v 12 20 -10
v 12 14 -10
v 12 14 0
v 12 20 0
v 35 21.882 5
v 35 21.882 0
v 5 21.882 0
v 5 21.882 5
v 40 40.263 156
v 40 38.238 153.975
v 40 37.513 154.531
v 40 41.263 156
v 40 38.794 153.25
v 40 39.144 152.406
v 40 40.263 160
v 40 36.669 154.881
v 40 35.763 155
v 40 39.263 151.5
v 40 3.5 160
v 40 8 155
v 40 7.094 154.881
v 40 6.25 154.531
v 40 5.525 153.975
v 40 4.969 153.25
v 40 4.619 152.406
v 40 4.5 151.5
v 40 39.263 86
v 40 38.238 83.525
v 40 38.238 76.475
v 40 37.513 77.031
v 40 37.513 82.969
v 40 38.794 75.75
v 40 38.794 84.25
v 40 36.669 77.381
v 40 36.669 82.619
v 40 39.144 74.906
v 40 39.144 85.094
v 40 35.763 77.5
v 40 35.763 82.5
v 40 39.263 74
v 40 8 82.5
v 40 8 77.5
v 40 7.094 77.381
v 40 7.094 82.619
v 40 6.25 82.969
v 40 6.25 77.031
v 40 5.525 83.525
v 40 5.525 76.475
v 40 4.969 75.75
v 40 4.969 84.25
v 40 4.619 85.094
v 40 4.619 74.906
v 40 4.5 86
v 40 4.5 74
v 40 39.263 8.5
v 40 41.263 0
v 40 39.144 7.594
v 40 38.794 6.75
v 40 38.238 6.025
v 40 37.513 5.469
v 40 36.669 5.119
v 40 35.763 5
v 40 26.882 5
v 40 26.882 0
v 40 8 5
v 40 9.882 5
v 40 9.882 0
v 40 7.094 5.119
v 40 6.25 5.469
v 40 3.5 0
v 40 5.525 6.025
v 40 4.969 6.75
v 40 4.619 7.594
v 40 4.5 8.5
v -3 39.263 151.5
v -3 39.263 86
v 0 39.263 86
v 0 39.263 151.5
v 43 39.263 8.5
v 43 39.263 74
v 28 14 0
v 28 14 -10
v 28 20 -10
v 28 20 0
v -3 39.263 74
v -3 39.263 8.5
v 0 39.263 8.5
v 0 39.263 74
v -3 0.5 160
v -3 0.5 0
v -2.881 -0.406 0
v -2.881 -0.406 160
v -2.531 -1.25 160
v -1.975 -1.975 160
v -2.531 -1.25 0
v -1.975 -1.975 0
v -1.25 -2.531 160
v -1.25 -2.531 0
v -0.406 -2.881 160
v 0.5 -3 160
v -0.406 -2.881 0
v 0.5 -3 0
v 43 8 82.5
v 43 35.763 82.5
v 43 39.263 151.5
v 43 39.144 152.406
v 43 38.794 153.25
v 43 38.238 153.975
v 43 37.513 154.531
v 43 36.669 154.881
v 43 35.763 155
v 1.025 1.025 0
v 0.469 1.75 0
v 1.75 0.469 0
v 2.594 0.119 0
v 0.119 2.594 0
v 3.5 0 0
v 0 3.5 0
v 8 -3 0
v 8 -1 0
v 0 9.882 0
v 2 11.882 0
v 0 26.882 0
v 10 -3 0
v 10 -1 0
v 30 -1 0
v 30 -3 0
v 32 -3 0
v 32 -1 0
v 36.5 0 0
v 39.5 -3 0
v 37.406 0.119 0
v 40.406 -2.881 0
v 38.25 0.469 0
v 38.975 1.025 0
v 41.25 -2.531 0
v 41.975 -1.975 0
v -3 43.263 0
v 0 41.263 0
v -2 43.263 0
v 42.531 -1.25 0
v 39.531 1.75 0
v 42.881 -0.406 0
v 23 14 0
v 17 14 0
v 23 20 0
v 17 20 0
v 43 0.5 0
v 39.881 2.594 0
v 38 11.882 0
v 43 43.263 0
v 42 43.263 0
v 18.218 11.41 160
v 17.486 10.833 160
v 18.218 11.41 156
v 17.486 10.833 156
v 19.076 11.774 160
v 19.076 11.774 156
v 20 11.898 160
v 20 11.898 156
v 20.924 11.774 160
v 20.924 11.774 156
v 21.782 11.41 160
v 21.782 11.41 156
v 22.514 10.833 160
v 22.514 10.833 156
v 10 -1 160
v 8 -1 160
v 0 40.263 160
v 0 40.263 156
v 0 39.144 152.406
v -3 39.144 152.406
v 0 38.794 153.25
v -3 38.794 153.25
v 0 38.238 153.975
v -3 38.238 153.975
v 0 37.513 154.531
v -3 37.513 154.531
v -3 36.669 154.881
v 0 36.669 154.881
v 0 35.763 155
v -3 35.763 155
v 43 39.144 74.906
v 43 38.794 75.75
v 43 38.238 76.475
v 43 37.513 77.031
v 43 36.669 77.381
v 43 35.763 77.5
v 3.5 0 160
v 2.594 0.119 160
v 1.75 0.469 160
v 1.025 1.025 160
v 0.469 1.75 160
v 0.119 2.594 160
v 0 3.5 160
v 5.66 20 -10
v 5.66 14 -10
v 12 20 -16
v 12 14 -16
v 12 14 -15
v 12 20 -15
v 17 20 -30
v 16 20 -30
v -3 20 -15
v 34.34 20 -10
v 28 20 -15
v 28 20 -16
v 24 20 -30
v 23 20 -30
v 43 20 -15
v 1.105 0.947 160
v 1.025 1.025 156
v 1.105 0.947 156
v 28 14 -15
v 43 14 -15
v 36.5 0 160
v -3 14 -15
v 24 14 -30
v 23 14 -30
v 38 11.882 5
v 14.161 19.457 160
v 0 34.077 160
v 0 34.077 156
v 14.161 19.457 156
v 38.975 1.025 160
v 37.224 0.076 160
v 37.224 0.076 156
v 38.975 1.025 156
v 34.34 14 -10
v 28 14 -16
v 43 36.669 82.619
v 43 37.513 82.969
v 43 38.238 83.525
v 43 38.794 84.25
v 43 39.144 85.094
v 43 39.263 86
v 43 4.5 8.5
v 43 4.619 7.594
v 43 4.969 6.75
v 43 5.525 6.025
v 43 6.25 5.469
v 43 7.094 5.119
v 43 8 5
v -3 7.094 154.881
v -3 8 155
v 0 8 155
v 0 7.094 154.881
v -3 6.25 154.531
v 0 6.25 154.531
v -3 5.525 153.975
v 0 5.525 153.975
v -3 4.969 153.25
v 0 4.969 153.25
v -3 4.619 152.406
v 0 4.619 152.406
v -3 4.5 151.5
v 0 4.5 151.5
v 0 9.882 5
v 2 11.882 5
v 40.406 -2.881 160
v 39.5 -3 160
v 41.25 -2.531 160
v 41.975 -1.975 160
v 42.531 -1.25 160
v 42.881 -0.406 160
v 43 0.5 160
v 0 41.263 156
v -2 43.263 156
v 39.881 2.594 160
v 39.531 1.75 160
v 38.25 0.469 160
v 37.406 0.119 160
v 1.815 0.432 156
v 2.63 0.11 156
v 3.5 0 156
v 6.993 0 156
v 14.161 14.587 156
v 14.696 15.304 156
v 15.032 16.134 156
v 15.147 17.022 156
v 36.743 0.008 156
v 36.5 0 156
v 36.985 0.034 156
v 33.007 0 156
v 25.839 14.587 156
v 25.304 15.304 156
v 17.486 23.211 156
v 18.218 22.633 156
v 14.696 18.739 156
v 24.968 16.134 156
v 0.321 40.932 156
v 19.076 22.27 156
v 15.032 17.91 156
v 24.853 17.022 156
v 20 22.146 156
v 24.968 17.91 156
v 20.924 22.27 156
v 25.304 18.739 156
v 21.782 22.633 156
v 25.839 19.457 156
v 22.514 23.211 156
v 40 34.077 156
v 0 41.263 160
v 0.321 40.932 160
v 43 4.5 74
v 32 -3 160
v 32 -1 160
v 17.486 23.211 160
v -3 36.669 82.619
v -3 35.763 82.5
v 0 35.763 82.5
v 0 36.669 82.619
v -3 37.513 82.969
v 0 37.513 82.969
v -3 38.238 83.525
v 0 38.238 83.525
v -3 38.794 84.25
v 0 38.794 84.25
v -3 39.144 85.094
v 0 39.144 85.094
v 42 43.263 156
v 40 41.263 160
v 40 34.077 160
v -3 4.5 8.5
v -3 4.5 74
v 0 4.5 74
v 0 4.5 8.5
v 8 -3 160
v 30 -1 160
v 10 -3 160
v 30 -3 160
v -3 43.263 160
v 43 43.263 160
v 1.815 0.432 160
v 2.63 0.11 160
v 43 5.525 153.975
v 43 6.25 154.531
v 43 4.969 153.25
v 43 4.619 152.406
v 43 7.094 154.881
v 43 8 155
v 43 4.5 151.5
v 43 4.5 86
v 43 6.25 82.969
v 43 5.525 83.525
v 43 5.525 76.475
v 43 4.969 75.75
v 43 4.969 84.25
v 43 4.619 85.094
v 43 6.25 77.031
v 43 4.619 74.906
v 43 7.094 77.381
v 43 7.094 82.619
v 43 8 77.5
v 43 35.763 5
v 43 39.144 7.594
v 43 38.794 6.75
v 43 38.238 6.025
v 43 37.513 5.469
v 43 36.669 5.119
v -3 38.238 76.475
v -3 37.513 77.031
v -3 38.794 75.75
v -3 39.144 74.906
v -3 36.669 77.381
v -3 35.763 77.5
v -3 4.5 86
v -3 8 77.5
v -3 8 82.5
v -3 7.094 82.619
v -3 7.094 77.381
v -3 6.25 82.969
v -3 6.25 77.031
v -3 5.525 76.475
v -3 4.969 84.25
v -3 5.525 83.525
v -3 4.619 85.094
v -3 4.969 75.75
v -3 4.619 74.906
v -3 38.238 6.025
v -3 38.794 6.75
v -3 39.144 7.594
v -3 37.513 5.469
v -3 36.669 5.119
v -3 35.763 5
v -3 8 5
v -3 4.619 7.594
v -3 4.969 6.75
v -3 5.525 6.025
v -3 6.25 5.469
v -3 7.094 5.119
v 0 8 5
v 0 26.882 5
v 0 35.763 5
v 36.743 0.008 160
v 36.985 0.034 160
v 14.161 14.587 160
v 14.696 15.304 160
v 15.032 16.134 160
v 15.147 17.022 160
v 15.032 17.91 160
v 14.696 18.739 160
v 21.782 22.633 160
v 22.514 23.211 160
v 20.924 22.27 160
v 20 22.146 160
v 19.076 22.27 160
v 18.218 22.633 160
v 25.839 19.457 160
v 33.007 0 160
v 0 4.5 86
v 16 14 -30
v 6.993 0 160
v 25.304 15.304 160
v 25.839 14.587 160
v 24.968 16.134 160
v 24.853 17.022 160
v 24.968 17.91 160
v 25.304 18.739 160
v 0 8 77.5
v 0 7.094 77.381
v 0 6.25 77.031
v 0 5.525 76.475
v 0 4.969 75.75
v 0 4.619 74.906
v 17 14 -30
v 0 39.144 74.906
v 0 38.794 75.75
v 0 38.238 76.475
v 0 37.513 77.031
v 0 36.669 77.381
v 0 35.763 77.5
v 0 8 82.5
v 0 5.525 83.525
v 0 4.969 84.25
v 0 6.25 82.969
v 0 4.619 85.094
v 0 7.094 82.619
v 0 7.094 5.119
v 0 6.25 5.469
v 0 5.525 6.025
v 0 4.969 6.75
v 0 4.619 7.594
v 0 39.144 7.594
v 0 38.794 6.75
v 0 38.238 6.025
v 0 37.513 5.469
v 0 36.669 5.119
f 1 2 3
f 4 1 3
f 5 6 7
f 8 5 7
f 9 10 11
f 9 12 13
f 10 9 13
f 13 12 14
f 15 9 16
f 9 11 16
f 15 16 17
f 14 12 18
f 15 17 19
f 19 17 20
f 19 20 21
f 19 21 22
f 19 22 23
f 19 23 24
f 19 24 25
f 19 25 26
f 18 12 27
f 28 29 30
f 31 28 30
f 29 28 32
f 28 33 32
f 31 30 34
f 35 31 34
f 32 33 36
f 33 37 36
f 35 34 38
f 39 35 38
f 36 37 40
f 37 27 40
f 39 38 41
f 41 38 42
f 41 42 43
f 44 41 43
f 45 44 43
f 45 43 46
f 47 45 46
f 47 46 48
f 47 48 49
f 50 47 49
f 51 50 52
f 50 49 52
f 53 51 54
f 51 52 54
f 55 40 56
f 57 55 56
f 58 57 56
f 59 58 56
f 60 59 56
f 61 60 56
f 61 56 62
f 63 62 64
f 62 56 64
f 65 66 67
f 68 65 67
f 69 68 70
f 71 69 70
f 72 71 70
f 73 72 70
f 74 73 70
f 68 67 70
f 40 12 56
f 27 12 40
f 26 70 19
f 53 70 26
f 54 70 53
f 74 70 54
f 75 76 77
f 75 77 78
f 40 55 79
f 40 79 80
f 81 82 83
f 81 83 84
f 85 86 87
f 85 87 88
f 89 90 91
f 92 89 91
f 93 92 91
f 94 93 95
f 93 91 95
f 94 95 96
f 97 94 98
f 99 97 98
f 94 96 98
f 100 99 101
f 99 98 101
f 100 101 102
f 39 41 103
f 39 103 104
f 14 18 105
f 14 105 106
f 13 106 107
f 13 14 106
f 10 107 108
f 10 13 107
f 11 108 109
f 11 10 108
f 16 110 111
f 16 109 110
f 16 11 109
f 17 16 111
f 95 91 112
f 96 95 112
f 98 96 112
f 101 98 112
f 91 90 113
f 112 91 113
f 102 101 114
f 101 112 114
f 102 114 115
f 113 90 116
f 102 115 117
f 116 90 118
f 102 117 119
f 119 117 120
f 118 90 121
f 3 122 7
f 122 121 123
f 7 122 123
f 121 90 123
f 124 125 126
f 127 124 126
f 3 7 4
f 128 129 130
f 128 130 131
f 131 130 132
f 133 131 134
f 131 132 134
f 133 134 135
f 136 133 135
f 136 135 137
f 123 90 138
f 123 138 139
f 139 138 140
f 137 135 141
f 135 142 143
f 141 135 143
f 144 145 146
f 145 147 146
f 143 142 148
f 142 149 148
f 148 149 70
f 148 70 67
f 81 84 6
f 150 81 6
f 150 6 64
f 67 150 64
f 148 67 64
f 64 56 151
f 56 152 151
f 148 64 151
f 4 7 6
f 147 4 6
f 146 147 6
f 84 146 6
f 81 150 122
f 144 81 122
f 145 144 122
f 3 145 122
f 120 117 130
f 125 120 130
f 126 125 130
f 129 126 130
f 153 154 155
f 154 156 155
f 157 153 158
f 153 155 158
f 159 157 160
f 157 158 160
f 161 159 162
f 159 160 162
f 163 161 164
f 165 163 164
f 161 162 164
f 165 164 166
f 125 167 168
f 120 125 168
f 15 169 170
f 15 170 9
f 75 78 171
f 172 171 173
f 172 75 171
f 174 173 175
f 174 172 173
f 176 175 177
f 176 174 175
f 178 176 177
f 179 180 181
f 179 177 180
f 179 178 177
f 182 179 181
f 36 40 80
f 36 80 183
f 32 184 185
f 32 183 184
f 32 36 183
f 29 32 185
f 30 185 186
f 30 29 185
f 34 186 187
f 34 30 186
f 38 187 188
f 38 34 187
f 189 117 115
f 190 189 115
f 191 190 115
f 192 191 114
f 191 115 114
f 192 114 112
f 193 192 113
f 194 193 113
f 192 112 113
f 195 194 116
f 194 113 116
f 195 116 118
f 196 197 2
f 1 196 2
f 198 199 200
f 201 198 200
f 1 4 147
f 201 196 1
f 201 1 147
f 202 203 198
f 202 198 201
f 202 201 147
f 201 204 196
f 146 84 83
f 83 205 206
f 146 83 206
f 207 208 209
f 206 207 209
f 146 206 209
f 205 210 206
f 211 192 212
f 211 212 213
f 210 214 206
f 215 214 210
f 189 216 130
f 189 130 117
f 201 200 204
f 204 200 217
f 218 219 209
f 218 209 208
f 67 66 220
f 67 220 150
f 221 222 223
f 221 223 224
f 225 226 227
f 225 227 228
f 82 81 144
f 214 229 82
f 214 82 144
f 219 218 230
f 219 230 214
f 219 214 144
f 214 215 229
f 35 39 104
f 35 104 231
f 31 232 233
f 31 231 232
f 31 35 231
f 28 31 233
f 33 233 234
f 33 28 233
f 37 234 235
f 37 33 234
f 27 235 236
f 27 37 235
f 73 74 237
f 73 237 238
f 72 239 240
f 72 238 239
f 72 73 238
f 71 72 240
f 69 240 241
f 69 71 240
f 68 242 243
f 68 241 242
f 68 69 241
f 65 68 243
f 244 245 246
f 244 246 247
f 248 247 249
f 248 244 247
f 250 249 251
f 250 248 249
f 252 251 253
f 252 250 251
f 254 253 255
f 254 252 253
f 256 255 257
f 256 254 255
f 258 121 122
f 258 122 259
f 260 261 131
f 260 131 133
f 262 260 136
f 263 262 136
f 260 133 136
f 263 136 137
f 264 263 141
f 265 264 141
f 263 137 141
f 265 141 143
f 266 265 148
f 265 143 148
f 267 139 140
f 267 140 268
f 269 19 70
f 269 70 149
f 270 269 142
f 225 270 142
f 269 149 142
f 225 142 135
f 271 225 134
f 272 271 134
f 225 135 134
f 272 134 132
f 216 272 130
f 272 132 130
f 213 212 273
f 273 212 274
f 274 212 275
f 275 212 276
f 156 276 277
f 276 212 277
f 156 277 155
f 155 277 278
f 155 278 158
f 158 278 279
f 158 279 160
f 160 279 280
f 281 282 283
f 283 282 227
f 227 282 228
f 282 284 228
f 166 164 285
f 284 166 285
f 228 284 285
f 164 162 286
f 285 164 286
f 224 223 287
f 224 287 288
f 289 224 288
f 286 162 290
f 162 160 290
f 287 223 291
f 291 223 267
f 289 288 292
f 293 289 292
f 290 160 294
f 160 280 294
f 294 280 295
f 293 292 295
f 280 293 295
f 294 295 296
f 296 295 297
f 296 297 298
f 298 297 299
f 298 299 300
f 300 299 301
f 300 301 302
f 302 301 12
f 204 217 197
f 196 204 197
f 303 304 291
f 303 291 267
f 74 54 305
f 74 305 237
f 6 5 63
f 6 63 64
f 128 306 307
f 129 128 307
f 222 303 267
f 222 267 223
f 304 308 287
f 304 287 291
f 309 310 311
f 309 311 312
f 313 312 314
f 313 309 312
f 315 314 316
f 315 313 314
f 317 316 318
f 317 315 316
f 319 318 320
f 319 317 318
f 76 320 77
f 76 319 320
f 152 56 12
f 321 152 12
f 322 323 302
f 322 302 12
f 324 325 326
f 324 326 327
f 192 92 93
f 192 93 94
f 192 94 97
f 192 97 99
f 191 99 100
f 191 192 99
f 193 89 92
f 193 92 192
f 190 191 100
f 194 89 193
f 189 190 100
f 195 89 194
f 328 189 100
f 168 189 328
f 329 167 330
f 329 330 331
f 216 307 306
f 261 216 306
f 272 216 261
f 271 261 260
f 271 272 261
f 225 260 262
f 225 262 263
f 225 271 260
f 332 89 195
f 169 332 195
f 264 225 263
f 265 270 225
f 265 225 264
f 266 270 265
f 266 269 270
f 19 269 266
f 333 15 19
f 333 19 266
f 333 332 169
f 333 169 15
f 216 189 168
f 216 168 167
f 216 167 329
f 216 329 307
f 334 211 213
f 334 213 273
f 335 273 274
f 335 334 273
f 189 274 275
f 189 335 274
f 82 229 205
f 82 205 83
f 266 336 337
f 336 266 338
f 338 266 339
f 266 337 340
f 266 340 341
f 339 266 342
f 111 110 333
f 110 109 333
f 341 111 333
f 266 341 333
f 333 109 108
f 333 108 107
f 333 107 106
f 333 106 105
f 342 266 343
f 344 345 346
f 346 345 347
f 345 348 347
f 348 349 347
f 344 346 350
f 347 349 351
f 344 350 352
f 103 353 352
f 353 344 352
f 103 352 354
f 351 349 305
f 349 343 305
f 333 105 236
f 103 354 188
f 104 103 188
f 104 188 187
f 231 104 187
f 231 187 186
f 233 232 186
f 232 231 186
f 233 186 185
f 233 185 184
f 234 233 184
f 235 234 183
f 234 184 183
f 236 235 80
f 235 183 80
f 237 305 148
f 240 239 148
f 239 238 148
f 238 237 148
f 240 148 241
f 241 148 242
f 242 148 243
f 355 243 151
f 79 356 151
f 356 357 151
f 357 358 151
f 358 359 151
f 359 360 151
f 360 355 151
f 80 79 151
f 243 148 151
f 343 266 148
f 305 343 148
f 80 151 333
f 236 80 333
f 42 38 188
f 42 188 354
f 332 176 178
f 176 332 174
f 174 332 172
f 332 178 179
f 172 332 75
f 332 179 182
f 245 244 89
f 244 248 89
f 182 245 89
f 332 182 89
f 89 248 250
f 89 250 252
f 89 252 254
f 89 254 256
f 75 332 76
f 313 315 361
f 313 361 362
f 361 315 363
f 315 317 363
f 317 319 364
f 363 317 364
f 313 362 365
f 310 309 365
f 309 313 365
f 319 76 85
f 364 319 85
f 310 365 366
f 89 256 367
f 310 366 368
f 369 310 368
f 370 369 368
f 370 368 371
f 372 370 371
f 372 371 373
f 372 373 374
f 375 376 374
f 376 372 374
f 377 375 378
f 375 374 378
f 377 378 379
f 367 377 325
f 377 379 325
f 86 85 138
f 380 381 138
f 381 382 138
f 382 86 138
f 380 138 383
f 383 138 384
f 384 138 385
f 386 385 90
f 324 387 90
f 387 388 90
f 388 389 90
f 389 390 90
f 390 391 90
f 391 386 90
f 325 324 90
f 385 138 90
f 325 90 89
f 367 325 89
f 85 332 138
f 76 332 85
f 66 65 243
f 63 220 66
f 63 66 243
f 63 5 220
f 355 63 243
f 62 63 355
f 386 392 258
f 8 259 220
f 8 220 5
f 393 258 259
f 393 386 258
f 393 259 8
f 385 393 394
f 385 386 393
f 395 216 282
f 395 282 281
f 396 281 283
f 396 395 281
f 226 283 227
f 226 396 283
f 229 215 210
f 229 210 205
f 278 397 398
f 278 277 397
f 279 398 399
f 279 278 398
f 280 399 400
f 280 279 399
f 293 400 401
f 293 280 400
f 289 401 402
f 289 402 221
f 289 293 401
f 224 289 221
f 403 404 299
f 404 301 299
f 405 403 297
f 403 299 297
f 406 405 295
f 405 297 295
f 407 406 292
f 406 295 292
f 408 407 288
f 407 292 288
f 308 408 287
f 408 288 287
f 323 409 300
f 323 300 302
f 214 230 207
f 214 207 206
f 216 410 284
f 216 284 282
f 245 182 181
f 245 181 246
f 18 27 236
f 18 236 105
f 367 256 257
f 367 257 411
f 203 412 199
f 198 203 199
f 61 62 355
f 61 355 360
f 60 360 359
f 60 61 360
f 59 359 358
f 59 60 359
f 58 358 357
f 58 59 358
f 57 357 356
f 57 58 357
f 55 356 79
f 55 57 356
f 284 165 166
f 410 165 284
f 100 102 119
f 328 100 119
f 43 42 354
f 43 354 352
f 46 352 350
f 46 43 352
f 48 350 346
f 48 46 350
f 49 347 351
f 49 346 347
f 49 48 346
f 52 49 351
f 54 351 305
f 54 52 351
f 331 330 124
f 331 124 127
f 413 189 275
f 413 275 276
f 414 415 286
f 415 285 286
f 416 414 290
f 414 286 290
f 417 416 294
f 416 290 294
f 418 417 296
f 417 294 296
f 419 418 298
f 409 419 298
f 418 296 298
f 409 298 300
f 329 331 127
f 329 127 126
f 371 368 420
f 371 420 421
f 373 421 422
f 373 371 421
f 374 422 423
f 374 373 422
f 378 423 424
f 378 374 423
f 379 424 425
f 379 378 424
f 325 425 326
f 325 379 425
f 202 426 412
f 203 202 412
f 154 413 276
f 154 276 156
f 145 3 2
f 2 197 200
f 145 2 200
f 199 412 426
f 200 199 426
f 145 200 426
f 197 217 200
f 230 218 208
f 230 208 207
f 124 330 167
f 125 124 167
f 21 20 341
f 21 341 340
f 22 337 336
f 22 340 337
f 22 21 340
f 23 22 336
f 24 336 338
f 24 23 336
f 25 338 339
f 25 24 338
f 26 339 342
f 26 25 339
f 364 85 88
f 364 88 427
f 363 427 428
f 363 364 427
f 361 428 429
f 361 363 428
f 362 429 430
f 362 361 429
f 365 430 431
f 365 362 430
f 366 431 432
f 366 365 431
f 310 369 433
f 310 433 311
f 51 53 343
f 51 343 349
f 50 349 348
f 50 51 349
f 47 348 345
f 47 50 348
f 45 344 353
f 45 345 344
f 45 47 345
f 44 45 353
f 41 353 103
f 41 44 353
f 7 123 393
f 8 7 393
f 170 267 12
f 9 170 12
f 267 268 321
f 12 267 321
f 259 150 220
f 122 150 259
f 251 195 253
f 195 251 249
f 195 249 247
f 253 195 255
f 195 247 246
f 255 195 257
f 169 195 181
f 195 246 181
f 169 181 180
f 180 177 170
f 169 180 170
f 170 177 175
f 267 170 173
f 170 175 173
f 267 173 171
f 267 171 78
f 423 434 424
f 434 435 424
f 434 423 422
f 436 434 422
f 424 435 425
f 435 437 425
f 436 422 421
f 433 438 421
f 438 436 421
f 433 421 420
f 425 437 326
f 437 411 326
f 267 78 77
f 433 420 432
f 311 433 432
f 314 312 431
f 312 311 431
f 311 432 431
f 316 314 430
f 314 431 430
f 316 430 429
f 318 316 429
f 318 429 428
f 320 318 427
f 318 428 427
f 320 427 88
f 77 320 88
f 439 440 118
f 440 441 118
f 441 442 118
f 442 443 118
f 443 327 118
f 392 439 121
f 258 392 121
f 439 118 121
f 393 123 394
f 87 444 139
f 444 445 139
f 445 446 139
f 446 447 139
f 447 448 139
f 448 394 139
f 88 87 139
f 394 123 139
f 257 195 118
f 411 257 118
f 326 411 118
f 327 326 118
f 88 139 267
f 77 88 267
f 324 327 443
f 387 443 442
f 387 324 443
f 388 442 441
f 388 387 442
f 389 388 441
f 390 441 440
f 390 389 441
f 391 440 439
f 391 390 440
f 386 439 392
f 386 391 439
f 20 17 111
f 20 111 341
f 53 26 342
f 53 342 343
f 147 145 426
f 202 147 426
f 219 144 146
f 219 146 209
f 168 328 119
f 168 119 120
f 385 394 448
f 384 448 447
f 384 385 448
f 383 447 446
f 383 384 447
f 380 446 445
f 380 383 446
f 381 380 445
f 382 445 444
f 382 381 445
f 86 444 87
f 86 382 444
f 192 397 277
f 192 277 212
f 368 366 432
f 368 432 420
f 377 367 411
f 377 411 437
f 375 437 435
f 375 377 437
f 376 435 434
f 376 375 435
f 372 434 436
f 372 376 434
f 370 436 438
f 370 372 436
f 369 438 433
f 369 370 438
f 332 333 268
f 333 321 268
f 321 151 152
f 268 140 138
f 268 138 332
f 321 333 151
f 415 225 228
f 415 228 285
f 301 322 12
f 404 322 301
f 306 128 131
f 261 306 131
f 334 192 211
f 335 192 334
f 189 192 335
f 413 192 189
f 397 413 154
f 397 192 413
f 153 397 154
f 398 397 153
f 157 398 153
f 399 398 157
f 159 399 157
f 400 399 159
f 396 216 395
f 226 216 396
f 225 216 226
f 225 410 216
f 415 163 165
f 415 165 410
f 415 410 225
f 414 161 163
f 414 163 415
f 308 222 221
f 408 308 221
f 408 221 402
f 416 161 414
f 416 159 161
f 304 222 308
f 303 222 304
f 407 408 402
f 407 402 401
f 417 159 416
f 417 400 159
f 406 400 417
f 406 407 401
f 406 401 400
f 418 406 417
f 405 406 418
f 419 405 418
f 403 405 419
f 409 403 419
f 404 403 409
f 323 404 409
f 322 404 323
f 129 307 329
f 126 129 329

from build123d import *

# Parameters (mm, degrees)
EXTRUDE_1_DEPTH     = 160
CUT_EXTRUDE_1_DEPTH = 160
CHAMFER_1_SIZE      = 2
EXTRUDE_3_DEPTH     = 4
FILLET_1_R          = 3.5
SKETCH_4_W          = 46
SKETCH_4_H          = 3
EXTRUDE_4_DEPTH     = 4
SKETCH_5_W          = 46
SKETCH_5_H          = 10
EXTRUDE_5_DEPTH     = 5
CHAMFER_2_SIZE      = 2
EXTRUDE_6_DEPTH     = 6
CHAMFER_3_SIZE      = 5
SKETCH_8_W          = 2
SKETCH_8_H          = 2
CUT_EXTRUDE_2_DEPTH = 172.232943631


with BuildPart() as part:
    # 草图1 → 凸台-拉伸1 (new body)
    with BuildSketch(Plane.XY):
        with BuildLine():
            Line((0, 43.263390812), (-3, 43.263390812))
            Line((-3, 43.263390812), (-3, 0.5))
            ThreePointArc((-3, 0.5), (-1.974873734, -1.974873734), (0.5, -3))
            Line((0.5, -3), (39.5, -3))
            ThreePointArc((39.5, -3), (41.974873734, -1.974873734), (43, 0.5))
            Line((43, 0.5), (43, 43.263390812))
            Line((43, 43.263390812), (40, 43.263390812))
            Line((40, 43.263390812), (40, 3.5))
            ThreePointArc((40, 3.5), (38.974873734, 1.025126266), (36.5, 0))
            Line((36.5, 0), (3.5, 0))
            ThreePointArc((3.5, 0), (1.025126266, 1.025126266), (0, 3.5))
            Line((0, 3.5), (0, 43.263390812))
        make_face()
    extrude(amount=EXTRUDE_1_DEPTH)

    # 草图2 → 切除-拉伸1 (cut)
    with BuildSketch(Plane.ZY.offset(3)):
        with BuildLine():
            Line((8.5, 39.263390812), (74, 39.263390812))
            ThreePointArc((74, 39.263390812), (76.474873734, 38.238264546), (77.5, 35.763390812))
            Line((77.5, 35.763390812), (77.5, 8))
            ThreePointArc((77.5, 8), (76.474873734, 5.525126266), (74, 4.5))
            Line((74, 4.5), (8.5, 4.5))
            ThreePointArc((8.5, 4.5), (6.025126266, 5.525126266), (5, 8))
            Line((5, 8), (5, 35.763390812))
            ThreePointArc((5, 35.763390812), (6.025126266, 38.238264546), (8.5, 39.263390812))
        make_face()
        with BuildLine():
            Line((86, 39.263390812), (151.5, 39.263390812))
            ThreePointArc((151.5, 39.263390812), (153.974873734, 38.238264546), (155, 35.763390812))
            Line((155, 35.763390812), (155, 8))
            ThreePointArc((155, 8), (153.974873734, 5.525126266), (151.5, 4.5))
            Line((151.5, 4.5), (86, 4.5))
            ThreePointArc((86, 4.5), (83.525126266, 5.525126266), (82.5, 8))
            Line((82.5, 8), (82.5, 35.763390812))
            ThreePointArc((82.5, 35.763390812), (83.525126266, 38.238264546), (86, 39.263390812))
        make_face()
    extrude(amount=-CUT_EXTRUDE_1_DEPTH, mode=Mode.SUBTRACT)

    # 倒角1
    chamfer_1_edges = [part.edges().sort_by_distance(p)[0] for p in [
        (40, 43.263390812, 80),
        (0, 43.263390812, 80),
    ]]
    chamfer(chamfer_1_edges, length=CHAMFER_1_SIZE)

    # 草图4 → 凸台-拉伸4 (add)
    with BuildSketch(Plane.XY.offset(160)):
        with Locations((20, 41.763390812)):
            Rectangle(SKETCH_4_W, SKETCH_4_H)
    extrude(amount=-EXTRUDE_4_DEPTH)

    # 草图5 → 凸台-拉伸5 (add)
    with BuildSketch(Plane(origin=(0, 0, 0), x_dir=(-1, 0, 0), z_dir=(0, 0, -1))):
        with Locations((-20, 16.881695406)):
            Rectangle(SKETCH_5_W, SKETCH_5_H)
    extrude(amount=-EXTRUDE_5_DEPTH)

    # 倒角2
    chamfer_2_edges = [part.edges().sort_by_distance(p)[0] for p in [
        (0, 11.881695406, 2.5),
        (40, 11.881695406, 2.5),
    ]]
    chamfer(chamfer_2_edges, length=CHAMFER_2_SIZE)

    # 草图7 → 凸台-拉伸6 (add)
    with BuildSketch(Plane(origin=(0, 14, 0), x_dir=(1, 0, 0), z_dir=(0, 1, 0))):
        Polygon((43, 15), (34.339745962, 10), (28, 10), (28, 0), (23, 0), (23, 30), (24, 30), (28, 16), (28, 15), align=None)
        Polygon((17, 0), (17, 30), (16, 30), (12, 16), (12, 15), (-3, 15), (5.660254038, 10), (12, 10), (12, 0), align=None)
    extrude(amount=EXTRUDE_6_DEPTH)

    # 倒角3
    chamfer_3_edges = [part.edges().sort_by_distance(p)[0] for p in [
        (0, 21.881695406, 2.5),
        (40, 21.881695406, 2.5),
    ]]
    chamfer(chamfer_3_edges, length=CHAMFER_3_SIZE)

    # 草图8 → 切除-拉伸2 (cut, through all)
    with BuildSketch(Plane(origin=(0, 0, 0), x_dir=(-1, 0, 0), z_dir=(0, 0, -1))):
        with Locations((-9, -2)):
            Rectangle(SKETCH_8_W, SKETCH_8_H)
        with Locations((-31, -2)):
            Rectangle(SKETCH_8_W, SKETCH_8_H)
    extrude(amount=-CUT_EXTRUDE_2_DEPTH, mode=Mode.SUBTRACT)


with BuildPart() as body_2:
    # 草图3 → 凸台-拉伸3 (new body)
    with BuildSketch(Plane.XY.offset(160)):
        Polygon((23.480472603, 17.021786472), (20, 20.615080405), (16.519527397, 17.021786472), (20, 13.428492539), align=None)
        Polygon((40, 34.076802945), (40, 41.263390812), (20, 20.615080405), (23.480472603, 17.021786472), align=None)
        with BuildLine():
            Line((38.974873734, 1.025126266), (23.480472603, 17.021786472))
            Line((23.480472603, 17.021786472), (20, 13.428492539))
            Line((20, 13.428492539), (33.00686814, 0))
            Line((33.00686814, 0), (36.5, 0))
            ThreePointArc((36.5, 0), (36.864065208, 0.018986279), (37.224180562, 0.075739129))
            Line((37.224180562, 0.075739129), (38.974873734, 1.025126266))
        make_face()
        with BuildLine():
            Line((20, 13.428492539), (16.519527397, 17.021786472))
            Line((16.519527397, 17.021786472), (1.025126266, 1.025126266))
            Line((1.025126266, 1.025126266), (1.105309781, 0.947460332))
            ThreePointArc((1.105309781, 0.947460332), (2.212344929, 0.245473242), (3.5, 0))
            Line((3.5, 0), (6.99313186, 0))
            Line((6.99313186, 0), (20, 13.428492539))
        make_face()
        Polygon((0.320654638, 40.932341987), (0, 41.263390812), (0, 34.076802945), (16.519527397, 17.021786472), (20, 20.615080405), align=None)
    extrude(amount=-EXTRUDE_3_DEPTH)

    # 圆角1
    fillet_1_edges = [body_2.edges().sort_by_distance(p)[0] for p in [
        (20, 20.615080405, 158),
        (23.480472603, 17.021786472, 158),
        (20, 13.428492539, 158),
        (16.519527397, 17.021786472, 158),
    ]]
    fillet(fillet_1_edges, radius=FILLET_1_R)


solid = Compound([part.part, body_2.part])
